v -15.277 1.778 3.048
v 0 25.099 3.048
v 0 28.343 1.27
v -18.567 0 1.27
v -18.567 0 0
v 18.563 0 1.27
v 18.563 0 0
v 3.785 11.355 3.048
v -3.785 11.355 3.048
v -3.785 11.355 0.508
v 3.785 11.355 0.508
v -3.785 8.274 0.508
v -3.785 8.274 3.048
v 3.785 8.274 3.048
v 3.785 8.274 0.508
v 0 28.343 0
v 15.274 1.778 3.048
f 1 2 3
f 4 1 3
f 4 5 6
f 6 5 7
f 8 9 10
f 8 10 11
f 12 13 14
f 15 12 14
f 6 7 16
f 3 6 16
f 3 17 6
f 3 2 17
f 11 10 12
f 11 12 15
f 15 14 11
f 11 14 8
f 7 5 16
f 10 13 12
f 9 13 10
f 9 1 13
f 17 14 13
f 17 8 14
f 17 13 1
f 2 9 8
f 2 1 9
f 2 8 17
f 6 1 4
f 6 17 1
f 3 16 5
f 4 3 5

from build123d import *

# Parameters (mm, degrees)
F1_DEPTH  = 3.048
F2_SIZE   = 1.778
F3_W      = 7.570412
F3_H      = 3.080346
F4_DEPTH  = 0.508
F4_FACE_W = 7.570412
F4_FACE_H = 3.080346
F5_DEPTH  = 2.032


with BuildPart() as f1:
    # F0 (on Top) → F1 (new body)
    with BuildSketch(Plane.XY):
        Polygon((-18.5674, 0), (0, 0), (18.563472, 0), (0, 28.34343), align=None)
    extrude(amount=F1_DEPTH)

    # F2
    f2_edges = [f1.edges().sort_by_distance(p)[0] for p in [
        (-9.2837, 14.171715, 3.048),
        (-0.001964, 0, 3.048),
        (9.281736, 14.171715, 3.048),
    ]]
    chamfer(f2_edges, length=F2_SIZE)

    # F3 (on face) → F4 (cut)
    with BuildSketch(Plane.XY.offset(3.048)):
        with Locations((0, 9.814435)):
            Rectangle(F3_W, F3_H)
    extrude(amount=-F4_DEPTH, mode=Mode.SUBTRACT)

    # F4_face (on face) → F5 (cut)
    with BuildSketch(Plane(origin=(0, 9.814435, 2.54), x_dir=(1, 0, 0), z_dir=(0, 0, 1))):
        Rectangle(F4_FACE_W, F4_FACE_H)
    extrude(amount=-F5_DEPTH, mode=Mode.SUBTRACT)


solid = f1.part
